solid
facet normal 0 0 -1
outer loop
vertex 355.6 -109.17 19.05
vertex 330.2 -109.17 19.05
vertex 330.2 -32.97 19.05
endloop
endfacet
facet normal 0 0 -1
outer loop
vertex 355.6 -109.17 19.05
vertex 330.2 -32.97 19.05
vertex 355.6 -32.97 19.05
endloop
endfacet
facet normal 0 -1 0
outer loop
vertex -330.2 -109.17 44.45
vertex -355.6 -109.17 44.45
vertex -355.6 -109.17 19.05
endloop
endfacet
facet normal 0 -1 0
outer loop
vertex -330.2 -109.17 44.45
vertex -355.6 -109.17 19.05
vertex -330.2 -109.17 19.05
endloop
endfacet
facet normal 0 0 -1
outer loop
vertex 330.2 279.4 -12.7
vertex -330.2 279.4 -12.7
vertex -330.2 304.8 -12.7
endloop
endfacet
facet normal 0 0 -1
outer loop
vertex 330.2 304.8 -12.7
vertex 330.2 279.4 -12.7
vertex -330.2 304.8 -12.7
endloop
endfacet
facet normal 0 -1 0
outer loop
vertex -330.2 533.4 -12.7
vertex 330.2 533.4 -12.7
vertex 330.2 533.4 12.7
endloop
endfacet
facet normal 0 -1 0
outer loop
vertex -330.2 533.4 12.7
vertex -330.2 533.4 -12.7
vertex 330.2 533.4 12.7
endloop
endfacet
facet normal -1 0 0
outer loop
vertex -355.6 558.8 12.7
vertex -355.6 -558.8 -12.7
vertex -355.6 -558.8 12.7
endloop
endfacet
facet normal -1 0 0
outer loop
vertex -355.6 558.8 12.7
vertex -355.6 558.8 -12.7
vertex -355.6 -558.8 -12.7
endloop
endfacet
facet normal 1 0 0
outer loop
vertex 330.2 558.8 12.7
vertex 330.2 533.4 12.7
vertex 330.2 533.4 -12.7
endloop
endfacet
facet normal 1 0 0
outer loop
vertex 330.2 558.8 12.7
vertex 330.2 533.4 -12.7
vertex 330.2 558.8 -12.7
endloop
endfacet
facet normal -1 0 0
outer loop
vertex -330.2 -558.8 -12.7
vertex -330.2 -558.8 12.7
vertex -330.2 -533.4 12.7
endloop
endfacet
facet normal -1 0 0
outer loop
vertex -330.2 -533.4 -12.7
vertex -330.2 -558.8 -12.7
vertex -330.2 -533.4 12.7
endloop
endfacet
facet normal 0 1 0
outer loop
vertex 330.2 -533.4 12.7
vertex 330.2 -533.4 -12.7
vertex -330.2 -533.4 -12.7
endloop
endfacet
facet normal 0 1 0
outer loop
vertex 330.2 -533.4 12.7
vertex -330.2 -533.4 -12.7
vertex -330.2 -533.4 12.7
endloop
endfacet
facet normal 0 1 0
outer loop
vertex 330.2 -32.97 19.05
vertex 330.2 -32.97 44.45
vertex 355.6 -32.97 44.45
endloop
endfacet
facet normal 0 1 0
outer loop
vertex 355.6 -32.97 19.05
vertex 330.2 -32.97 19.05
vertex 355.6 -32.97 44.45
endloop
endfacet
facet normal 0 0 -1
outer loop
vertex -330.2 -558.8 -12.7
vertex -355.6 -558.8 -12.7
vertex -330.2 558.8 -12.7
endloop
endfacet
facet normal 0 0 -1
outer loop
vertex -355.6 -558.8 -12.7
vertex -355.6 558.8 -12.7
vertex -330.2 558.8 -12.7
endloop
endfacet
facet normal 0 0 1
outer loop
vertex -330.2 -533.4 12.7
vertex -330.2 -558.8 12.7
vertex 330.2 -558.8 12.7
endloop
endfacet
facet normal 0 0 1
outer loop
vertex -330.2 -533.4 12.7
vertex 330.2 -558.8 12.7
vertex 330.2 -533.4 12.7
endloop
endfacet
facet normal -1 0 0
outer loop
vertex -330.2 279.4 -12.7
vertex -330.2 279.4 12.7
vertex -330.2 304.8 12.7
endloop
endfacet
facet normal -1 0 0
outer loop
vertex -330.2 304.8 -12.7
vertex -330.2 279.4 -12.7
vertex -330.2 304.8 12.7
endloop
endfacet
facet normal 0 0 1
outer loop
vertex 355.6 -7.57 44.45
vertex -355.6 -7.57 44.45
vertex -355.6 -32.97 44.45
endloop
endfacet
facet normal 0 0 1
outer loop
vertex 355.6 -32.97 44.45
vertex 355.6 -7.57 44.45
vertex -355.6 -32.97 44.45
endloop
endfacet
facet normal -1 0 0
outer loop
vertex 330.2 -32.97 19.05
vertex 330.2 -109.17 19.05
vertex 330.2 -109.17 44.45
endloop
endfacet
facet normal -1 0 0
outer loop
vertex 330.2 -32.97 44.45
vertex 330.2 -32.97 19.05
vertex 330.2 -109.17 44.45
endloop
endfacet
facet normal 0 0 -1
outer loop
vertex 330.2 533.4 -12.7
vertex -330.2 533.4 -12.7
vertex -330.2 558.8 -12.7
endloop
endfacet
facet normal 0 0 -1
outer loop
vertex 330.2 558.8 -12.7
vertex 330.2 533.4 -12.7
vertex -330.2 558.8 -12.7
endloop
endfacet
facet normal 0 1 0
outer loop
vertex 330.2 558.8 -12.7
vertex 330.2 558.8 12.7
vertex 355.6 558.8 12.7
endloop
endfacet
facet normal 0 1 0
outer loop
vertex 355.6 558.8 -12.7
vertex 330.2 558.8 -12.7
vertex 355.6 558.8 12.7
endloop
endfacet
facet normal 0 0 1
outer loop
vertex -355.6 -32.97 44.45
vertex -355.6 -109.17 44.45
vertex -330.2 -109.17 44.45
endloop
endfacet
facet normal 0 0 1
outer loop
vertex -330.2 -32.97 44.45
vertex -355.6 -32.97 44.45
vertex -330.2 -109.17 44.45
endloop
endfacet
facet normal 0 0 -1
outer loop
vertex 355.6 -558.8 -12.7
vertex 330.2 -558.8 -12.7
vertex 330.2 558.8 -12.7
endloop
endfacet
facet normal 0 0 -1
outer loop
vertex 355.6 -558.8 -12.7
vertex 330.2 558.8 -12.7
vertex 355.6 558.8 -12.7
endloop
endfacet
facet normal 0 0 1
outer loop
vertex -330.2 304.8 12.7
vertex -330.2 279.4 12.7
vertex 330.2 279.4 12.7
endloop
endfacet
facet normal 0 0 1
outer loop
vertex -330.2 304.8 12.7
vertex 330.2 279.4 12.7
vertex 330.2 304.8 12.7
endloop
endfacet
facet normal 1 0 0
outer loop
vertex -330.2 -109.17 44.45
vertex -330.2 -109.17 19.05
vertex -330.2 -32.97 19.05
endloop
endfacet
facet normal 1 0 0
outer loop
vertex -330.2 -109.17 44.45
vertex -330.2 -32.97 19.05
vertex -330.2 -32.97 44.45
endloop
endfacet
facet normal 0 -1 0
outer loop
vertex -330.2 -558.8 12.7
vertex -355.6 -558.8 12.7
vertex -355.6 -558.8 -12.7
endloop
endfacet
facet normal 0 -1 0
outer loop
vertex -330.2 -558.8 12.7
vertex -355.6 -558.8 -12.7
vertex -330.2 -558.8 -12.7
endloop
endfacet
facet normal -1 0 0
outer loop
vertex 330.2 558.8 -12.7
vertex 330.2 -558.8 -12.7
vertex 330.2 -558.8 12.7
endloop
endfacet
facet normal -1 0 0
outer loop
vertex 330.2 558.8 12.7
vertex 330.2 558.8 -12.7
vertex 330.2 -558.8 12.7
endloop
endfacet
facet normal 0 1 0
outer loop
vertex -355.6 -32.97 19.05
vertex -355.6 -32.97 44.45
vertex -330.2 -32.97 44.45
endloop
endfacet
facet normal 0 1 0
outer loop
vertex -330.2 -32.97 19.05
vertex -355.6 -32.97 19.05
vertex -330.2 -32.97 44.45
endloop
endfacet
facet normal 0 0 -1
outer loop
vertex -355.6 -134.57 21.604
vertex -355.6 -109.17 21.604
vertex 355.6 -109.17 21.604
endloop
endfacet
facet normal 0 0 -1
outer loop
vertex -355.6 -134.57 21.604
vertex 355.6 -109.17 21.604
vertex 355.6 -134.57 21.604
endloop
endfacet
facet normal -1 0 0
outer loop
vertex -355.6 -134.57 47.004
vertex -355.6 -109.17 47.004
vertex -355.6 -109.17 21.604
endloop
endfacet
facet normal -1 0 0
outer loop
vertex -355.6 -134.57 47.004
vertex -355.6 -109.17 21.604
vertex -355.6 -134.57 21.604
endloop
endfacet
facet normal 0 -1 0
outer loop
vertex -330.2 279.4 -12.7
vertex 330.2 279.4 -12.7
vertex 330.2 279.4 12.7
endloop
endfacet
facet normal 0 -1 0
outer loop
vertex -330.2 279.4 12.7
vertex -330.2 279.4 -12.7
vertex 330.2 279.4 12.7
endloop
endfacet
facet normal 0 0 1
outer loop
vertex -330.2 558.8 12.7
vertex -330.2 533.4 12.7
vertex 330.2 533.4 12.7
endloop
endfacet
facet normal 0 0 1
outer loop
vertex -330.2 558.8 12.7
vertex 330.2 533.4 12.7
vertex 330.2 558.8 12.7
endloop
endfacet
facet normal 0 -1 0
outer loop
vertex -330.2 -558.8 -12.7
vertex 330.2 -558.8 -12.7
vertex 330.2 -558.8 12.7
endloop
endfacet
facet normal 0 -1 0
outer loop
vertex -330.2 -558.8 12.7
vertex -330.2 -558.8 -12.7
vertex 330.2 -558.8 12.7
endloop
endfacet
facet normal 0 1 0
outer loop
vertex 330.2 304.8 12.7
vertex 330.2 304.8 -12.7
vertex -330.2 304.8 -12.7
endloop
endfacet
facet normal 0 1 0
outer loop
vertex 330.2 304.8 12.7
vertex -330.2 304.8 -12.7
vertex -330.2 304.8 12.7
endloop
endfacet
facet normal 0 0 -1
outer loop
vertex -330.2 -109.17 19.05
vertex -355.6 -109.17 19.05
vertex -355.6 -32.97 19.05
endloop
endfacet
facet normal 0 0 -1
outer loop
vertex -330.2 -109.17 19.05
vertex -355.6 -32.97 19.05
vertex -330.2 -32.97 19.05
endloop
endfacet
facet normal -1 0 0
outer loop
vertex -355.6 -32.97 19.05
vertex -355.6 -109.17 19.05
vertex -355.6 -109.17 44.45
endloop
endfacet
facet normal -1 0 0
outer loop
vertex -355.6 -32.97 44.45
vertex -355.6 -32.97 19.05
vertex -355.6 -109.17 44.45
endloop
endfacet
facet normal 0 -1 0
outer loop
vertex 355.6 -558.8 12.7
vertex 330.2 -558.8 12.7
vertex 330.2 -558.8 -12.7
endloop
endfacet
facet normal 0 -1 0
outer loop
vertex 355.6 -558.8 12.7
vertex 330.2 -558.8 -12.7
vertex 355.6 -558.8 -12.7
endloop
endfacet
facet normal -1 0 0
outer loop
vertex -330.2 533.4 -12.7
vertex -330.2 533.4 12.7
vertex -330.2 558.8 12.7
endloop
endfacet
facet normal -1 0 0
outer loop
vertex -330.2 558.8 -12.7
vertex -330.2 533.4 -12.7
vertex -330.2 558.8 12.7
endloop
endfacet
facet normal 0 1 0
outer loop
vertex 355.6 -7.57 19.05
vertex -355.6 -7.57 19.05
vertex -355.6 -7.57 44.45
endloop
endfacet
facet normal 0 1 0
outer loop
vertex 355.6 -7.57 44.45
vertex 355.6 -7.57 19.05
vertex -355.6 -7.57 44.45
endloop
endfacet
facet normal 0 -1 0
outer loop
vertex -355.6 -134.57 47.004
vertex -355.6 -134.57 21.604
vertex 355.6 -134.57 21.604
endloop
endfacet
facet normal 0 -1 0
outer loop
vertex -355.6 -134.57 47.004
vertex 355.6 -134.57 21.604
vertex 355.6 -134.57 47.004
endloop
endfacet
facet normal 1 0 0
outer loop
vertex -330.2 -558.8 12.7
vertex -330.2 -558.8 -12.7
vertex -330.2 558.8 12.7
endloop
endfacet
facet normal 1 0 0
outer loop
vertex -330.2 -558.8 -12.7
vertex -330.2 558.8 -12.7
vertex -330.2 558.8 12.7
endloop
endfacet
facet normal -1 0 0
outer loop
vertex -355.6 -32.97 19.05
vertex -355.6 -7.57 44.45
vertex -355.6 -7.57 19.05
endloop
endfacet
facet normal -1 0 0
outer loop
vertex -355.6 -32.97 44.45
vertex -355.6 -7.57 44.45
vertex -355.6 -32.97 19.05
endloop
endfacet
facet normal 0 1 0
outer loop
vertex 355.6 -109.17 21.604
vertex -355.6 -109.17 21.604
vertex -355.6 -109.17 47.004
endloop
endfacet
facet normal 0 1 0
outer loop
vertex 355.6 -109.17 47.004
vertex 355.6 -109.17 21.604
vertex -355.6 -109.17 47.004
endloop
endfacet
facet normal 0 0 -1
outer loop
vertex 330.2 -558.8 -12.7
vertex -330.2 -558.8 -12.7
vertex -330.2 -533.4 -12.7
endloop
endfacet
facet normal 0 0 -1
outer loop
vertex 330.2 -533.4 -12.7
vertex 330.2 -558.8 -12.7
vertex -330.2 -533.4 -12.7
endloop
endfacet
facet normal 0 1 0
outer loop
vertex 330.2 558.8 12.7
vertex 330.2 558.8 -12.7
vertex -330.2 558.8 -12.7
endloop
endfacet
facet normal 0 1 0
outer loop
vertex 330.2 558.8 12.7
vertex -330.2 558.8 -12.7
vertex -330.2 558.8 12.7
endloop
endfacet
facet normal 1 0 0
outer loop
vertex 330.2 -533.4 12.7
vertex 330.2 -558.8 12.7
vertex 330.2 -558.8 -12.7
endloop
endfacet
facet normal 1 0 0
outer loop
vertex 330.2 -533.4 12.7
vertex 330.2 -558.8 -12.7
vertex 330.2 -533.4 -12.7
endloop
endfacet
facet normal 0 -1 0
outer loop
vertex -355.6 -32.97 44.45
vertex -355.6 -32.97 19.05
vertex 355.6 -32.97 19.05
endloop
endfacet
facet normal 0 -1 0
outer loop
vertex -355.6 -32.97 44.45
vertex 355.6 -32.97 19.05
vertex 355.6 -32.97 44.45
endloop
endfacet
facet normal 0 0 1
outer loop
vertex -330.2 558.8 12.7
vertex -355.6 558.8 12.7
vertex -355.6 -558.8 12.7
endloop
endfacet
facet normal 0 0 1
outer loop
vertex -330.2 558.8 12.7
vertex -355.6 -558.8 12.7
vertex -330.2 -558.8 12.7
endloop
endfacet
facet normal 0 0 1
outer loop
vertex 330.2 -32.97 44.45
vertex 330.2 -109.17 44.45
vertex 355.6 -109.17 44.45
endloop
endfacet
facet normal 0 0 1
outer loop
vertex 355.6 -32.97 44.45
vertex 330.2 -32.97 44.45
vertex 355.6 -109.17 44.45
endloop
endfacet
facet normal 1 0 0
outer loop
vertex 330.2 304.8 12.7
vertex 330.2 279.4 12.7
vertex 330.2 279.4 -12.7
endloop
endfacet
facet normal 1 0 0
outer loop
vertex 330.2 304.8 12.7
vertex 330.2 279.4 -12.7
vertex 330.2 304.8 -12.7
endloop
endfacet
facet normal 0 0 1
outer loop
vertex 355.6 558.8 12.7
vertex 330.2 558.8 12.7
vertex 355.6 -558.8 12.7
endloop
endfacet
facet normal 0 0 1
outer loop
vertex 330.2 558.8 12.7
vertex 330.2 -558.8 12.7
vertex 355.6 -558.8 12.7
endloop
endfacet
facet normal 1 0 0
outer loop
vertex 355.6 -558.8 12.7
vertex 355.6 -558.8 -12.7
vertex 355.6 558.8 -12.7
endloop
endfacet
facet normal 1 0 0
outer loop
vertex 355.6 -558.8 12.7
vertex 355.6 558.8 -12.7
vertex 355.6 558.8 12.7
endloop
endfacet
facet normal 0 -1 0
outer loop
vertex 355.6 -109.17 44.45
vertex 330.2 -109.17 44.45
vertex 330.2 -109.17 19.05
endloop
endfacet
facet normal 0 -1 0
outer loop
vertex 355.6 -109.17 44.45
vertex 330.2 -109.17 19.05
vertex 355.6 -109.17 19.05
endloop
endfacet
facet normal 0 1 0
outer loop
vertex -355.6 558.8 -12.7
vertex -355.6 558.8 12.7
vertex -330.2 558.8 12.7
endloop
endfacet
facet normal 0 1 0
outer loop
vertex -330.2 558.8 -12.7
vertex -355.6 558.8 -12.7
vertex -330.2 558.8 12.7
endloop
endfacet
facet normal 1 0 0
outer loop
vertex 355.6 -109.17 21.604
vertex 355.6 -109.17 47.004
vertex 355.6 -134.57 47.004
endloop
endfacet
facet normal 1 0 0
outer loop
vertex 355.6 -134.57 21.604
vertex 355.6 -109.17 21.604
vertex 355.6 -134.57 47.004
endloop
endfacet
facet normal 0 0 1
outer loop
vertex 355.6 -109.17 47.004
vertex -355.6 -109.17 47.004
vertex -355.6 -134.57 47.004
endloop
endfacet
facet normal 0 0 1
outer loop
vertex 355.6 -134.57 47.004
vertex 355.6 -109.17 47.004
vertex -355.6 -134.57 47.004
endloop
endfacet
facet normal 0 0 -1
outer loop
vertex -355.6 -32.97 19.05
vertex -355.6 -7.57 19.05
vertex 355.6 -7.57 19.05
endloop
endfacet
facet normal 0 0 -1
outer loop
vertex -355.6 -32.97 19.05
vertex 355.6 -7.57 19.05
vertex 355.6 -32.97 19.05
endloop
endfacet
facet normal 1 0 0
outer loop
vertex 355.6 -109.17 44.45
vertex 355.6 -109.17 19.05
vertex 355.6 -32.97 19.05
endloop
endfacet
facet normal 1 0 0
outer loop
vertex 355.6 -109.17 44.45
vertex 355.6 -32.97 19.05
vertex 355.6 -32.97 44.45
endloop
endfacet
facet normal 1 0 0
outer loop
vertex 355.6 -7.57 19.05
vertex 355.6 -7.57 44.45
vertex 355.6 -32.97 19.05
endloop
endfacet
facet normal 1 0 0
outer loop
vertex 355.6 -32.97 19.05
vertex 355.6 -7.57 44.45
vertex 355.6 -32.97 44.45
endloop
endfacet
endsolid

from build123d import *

# Parameters (mm, degrees)
F0_W     = 25.4
F0_H     = 25.4
F1_DEPTH = 558.8
F2_W     = 25.4
F2_H     = 25.4
F3_DEPTH = 660.4
F4_W     = 25.4
F4_H     = 25.4
F5_DEPTH = 711.2
F6_W     = 25.4
F6_H     = 25.4
F7_DEPTH = 76.2


with BuildPart() as f1:
    # F0 (on Front) → F1 (new body, symmetric)
    with BuildSketch(Plane.XZ):
        with Locations((-342.9, 0)):
            Rectangle(F0_W, F0_H)
        with Locations((342.9, 0)):
            Rectangle(F0_W, F0_H)
    extrude(amount=F1_DEPTH, both=True)


with BuildPart() as f3:
    # F2 (on face) → F3 (new body, through all)
    with BuildSketch(Plane.YZ.offset(-330.2)):
        with Locations((546.1, 0)):
            Rectangle(F2_W, F2_H)
        with Locations((292.1, 0)):
            Rectangle(F2_W, F2_H)
        with Locations((-546.1, 0)):
            Rectangle(F2_W, F2_H)
    extrude(amount=F3_DEPTH)


with BuildPart() as f5:
    # F4 (on face) → F5 (new body, through all)
    with BuildSketch(Plane(origin=(-355.6, 0, 0), x_dir=(0, -1, 0), z_dir=(-1, 0, 0))):
        with Locations((20.269574, 31.75)):
            Rectangle(F4_W, F4_H)
        with Locations((121.869574, 34.304203)):
            Rectangle(F4_W, F4_H)
    extrude(amount=-F5_DEPTH)


with BuildPart() as f7:
    # F6 (on face) → F7 (new body, through all)
    with BuildSketch(Plane.XZ.offset(32.969574)):
        with Locations((-342.9, 31.75)):
            Rectangle(F6_W, F6_H)
        with Locations((342.9, 31.75)):
            Rectangle(F6_W, F6_H)
    extrude(amount=F7_DEPTH)


solid = Compound([f1.part, f3.part, f5.part, f7.part])
